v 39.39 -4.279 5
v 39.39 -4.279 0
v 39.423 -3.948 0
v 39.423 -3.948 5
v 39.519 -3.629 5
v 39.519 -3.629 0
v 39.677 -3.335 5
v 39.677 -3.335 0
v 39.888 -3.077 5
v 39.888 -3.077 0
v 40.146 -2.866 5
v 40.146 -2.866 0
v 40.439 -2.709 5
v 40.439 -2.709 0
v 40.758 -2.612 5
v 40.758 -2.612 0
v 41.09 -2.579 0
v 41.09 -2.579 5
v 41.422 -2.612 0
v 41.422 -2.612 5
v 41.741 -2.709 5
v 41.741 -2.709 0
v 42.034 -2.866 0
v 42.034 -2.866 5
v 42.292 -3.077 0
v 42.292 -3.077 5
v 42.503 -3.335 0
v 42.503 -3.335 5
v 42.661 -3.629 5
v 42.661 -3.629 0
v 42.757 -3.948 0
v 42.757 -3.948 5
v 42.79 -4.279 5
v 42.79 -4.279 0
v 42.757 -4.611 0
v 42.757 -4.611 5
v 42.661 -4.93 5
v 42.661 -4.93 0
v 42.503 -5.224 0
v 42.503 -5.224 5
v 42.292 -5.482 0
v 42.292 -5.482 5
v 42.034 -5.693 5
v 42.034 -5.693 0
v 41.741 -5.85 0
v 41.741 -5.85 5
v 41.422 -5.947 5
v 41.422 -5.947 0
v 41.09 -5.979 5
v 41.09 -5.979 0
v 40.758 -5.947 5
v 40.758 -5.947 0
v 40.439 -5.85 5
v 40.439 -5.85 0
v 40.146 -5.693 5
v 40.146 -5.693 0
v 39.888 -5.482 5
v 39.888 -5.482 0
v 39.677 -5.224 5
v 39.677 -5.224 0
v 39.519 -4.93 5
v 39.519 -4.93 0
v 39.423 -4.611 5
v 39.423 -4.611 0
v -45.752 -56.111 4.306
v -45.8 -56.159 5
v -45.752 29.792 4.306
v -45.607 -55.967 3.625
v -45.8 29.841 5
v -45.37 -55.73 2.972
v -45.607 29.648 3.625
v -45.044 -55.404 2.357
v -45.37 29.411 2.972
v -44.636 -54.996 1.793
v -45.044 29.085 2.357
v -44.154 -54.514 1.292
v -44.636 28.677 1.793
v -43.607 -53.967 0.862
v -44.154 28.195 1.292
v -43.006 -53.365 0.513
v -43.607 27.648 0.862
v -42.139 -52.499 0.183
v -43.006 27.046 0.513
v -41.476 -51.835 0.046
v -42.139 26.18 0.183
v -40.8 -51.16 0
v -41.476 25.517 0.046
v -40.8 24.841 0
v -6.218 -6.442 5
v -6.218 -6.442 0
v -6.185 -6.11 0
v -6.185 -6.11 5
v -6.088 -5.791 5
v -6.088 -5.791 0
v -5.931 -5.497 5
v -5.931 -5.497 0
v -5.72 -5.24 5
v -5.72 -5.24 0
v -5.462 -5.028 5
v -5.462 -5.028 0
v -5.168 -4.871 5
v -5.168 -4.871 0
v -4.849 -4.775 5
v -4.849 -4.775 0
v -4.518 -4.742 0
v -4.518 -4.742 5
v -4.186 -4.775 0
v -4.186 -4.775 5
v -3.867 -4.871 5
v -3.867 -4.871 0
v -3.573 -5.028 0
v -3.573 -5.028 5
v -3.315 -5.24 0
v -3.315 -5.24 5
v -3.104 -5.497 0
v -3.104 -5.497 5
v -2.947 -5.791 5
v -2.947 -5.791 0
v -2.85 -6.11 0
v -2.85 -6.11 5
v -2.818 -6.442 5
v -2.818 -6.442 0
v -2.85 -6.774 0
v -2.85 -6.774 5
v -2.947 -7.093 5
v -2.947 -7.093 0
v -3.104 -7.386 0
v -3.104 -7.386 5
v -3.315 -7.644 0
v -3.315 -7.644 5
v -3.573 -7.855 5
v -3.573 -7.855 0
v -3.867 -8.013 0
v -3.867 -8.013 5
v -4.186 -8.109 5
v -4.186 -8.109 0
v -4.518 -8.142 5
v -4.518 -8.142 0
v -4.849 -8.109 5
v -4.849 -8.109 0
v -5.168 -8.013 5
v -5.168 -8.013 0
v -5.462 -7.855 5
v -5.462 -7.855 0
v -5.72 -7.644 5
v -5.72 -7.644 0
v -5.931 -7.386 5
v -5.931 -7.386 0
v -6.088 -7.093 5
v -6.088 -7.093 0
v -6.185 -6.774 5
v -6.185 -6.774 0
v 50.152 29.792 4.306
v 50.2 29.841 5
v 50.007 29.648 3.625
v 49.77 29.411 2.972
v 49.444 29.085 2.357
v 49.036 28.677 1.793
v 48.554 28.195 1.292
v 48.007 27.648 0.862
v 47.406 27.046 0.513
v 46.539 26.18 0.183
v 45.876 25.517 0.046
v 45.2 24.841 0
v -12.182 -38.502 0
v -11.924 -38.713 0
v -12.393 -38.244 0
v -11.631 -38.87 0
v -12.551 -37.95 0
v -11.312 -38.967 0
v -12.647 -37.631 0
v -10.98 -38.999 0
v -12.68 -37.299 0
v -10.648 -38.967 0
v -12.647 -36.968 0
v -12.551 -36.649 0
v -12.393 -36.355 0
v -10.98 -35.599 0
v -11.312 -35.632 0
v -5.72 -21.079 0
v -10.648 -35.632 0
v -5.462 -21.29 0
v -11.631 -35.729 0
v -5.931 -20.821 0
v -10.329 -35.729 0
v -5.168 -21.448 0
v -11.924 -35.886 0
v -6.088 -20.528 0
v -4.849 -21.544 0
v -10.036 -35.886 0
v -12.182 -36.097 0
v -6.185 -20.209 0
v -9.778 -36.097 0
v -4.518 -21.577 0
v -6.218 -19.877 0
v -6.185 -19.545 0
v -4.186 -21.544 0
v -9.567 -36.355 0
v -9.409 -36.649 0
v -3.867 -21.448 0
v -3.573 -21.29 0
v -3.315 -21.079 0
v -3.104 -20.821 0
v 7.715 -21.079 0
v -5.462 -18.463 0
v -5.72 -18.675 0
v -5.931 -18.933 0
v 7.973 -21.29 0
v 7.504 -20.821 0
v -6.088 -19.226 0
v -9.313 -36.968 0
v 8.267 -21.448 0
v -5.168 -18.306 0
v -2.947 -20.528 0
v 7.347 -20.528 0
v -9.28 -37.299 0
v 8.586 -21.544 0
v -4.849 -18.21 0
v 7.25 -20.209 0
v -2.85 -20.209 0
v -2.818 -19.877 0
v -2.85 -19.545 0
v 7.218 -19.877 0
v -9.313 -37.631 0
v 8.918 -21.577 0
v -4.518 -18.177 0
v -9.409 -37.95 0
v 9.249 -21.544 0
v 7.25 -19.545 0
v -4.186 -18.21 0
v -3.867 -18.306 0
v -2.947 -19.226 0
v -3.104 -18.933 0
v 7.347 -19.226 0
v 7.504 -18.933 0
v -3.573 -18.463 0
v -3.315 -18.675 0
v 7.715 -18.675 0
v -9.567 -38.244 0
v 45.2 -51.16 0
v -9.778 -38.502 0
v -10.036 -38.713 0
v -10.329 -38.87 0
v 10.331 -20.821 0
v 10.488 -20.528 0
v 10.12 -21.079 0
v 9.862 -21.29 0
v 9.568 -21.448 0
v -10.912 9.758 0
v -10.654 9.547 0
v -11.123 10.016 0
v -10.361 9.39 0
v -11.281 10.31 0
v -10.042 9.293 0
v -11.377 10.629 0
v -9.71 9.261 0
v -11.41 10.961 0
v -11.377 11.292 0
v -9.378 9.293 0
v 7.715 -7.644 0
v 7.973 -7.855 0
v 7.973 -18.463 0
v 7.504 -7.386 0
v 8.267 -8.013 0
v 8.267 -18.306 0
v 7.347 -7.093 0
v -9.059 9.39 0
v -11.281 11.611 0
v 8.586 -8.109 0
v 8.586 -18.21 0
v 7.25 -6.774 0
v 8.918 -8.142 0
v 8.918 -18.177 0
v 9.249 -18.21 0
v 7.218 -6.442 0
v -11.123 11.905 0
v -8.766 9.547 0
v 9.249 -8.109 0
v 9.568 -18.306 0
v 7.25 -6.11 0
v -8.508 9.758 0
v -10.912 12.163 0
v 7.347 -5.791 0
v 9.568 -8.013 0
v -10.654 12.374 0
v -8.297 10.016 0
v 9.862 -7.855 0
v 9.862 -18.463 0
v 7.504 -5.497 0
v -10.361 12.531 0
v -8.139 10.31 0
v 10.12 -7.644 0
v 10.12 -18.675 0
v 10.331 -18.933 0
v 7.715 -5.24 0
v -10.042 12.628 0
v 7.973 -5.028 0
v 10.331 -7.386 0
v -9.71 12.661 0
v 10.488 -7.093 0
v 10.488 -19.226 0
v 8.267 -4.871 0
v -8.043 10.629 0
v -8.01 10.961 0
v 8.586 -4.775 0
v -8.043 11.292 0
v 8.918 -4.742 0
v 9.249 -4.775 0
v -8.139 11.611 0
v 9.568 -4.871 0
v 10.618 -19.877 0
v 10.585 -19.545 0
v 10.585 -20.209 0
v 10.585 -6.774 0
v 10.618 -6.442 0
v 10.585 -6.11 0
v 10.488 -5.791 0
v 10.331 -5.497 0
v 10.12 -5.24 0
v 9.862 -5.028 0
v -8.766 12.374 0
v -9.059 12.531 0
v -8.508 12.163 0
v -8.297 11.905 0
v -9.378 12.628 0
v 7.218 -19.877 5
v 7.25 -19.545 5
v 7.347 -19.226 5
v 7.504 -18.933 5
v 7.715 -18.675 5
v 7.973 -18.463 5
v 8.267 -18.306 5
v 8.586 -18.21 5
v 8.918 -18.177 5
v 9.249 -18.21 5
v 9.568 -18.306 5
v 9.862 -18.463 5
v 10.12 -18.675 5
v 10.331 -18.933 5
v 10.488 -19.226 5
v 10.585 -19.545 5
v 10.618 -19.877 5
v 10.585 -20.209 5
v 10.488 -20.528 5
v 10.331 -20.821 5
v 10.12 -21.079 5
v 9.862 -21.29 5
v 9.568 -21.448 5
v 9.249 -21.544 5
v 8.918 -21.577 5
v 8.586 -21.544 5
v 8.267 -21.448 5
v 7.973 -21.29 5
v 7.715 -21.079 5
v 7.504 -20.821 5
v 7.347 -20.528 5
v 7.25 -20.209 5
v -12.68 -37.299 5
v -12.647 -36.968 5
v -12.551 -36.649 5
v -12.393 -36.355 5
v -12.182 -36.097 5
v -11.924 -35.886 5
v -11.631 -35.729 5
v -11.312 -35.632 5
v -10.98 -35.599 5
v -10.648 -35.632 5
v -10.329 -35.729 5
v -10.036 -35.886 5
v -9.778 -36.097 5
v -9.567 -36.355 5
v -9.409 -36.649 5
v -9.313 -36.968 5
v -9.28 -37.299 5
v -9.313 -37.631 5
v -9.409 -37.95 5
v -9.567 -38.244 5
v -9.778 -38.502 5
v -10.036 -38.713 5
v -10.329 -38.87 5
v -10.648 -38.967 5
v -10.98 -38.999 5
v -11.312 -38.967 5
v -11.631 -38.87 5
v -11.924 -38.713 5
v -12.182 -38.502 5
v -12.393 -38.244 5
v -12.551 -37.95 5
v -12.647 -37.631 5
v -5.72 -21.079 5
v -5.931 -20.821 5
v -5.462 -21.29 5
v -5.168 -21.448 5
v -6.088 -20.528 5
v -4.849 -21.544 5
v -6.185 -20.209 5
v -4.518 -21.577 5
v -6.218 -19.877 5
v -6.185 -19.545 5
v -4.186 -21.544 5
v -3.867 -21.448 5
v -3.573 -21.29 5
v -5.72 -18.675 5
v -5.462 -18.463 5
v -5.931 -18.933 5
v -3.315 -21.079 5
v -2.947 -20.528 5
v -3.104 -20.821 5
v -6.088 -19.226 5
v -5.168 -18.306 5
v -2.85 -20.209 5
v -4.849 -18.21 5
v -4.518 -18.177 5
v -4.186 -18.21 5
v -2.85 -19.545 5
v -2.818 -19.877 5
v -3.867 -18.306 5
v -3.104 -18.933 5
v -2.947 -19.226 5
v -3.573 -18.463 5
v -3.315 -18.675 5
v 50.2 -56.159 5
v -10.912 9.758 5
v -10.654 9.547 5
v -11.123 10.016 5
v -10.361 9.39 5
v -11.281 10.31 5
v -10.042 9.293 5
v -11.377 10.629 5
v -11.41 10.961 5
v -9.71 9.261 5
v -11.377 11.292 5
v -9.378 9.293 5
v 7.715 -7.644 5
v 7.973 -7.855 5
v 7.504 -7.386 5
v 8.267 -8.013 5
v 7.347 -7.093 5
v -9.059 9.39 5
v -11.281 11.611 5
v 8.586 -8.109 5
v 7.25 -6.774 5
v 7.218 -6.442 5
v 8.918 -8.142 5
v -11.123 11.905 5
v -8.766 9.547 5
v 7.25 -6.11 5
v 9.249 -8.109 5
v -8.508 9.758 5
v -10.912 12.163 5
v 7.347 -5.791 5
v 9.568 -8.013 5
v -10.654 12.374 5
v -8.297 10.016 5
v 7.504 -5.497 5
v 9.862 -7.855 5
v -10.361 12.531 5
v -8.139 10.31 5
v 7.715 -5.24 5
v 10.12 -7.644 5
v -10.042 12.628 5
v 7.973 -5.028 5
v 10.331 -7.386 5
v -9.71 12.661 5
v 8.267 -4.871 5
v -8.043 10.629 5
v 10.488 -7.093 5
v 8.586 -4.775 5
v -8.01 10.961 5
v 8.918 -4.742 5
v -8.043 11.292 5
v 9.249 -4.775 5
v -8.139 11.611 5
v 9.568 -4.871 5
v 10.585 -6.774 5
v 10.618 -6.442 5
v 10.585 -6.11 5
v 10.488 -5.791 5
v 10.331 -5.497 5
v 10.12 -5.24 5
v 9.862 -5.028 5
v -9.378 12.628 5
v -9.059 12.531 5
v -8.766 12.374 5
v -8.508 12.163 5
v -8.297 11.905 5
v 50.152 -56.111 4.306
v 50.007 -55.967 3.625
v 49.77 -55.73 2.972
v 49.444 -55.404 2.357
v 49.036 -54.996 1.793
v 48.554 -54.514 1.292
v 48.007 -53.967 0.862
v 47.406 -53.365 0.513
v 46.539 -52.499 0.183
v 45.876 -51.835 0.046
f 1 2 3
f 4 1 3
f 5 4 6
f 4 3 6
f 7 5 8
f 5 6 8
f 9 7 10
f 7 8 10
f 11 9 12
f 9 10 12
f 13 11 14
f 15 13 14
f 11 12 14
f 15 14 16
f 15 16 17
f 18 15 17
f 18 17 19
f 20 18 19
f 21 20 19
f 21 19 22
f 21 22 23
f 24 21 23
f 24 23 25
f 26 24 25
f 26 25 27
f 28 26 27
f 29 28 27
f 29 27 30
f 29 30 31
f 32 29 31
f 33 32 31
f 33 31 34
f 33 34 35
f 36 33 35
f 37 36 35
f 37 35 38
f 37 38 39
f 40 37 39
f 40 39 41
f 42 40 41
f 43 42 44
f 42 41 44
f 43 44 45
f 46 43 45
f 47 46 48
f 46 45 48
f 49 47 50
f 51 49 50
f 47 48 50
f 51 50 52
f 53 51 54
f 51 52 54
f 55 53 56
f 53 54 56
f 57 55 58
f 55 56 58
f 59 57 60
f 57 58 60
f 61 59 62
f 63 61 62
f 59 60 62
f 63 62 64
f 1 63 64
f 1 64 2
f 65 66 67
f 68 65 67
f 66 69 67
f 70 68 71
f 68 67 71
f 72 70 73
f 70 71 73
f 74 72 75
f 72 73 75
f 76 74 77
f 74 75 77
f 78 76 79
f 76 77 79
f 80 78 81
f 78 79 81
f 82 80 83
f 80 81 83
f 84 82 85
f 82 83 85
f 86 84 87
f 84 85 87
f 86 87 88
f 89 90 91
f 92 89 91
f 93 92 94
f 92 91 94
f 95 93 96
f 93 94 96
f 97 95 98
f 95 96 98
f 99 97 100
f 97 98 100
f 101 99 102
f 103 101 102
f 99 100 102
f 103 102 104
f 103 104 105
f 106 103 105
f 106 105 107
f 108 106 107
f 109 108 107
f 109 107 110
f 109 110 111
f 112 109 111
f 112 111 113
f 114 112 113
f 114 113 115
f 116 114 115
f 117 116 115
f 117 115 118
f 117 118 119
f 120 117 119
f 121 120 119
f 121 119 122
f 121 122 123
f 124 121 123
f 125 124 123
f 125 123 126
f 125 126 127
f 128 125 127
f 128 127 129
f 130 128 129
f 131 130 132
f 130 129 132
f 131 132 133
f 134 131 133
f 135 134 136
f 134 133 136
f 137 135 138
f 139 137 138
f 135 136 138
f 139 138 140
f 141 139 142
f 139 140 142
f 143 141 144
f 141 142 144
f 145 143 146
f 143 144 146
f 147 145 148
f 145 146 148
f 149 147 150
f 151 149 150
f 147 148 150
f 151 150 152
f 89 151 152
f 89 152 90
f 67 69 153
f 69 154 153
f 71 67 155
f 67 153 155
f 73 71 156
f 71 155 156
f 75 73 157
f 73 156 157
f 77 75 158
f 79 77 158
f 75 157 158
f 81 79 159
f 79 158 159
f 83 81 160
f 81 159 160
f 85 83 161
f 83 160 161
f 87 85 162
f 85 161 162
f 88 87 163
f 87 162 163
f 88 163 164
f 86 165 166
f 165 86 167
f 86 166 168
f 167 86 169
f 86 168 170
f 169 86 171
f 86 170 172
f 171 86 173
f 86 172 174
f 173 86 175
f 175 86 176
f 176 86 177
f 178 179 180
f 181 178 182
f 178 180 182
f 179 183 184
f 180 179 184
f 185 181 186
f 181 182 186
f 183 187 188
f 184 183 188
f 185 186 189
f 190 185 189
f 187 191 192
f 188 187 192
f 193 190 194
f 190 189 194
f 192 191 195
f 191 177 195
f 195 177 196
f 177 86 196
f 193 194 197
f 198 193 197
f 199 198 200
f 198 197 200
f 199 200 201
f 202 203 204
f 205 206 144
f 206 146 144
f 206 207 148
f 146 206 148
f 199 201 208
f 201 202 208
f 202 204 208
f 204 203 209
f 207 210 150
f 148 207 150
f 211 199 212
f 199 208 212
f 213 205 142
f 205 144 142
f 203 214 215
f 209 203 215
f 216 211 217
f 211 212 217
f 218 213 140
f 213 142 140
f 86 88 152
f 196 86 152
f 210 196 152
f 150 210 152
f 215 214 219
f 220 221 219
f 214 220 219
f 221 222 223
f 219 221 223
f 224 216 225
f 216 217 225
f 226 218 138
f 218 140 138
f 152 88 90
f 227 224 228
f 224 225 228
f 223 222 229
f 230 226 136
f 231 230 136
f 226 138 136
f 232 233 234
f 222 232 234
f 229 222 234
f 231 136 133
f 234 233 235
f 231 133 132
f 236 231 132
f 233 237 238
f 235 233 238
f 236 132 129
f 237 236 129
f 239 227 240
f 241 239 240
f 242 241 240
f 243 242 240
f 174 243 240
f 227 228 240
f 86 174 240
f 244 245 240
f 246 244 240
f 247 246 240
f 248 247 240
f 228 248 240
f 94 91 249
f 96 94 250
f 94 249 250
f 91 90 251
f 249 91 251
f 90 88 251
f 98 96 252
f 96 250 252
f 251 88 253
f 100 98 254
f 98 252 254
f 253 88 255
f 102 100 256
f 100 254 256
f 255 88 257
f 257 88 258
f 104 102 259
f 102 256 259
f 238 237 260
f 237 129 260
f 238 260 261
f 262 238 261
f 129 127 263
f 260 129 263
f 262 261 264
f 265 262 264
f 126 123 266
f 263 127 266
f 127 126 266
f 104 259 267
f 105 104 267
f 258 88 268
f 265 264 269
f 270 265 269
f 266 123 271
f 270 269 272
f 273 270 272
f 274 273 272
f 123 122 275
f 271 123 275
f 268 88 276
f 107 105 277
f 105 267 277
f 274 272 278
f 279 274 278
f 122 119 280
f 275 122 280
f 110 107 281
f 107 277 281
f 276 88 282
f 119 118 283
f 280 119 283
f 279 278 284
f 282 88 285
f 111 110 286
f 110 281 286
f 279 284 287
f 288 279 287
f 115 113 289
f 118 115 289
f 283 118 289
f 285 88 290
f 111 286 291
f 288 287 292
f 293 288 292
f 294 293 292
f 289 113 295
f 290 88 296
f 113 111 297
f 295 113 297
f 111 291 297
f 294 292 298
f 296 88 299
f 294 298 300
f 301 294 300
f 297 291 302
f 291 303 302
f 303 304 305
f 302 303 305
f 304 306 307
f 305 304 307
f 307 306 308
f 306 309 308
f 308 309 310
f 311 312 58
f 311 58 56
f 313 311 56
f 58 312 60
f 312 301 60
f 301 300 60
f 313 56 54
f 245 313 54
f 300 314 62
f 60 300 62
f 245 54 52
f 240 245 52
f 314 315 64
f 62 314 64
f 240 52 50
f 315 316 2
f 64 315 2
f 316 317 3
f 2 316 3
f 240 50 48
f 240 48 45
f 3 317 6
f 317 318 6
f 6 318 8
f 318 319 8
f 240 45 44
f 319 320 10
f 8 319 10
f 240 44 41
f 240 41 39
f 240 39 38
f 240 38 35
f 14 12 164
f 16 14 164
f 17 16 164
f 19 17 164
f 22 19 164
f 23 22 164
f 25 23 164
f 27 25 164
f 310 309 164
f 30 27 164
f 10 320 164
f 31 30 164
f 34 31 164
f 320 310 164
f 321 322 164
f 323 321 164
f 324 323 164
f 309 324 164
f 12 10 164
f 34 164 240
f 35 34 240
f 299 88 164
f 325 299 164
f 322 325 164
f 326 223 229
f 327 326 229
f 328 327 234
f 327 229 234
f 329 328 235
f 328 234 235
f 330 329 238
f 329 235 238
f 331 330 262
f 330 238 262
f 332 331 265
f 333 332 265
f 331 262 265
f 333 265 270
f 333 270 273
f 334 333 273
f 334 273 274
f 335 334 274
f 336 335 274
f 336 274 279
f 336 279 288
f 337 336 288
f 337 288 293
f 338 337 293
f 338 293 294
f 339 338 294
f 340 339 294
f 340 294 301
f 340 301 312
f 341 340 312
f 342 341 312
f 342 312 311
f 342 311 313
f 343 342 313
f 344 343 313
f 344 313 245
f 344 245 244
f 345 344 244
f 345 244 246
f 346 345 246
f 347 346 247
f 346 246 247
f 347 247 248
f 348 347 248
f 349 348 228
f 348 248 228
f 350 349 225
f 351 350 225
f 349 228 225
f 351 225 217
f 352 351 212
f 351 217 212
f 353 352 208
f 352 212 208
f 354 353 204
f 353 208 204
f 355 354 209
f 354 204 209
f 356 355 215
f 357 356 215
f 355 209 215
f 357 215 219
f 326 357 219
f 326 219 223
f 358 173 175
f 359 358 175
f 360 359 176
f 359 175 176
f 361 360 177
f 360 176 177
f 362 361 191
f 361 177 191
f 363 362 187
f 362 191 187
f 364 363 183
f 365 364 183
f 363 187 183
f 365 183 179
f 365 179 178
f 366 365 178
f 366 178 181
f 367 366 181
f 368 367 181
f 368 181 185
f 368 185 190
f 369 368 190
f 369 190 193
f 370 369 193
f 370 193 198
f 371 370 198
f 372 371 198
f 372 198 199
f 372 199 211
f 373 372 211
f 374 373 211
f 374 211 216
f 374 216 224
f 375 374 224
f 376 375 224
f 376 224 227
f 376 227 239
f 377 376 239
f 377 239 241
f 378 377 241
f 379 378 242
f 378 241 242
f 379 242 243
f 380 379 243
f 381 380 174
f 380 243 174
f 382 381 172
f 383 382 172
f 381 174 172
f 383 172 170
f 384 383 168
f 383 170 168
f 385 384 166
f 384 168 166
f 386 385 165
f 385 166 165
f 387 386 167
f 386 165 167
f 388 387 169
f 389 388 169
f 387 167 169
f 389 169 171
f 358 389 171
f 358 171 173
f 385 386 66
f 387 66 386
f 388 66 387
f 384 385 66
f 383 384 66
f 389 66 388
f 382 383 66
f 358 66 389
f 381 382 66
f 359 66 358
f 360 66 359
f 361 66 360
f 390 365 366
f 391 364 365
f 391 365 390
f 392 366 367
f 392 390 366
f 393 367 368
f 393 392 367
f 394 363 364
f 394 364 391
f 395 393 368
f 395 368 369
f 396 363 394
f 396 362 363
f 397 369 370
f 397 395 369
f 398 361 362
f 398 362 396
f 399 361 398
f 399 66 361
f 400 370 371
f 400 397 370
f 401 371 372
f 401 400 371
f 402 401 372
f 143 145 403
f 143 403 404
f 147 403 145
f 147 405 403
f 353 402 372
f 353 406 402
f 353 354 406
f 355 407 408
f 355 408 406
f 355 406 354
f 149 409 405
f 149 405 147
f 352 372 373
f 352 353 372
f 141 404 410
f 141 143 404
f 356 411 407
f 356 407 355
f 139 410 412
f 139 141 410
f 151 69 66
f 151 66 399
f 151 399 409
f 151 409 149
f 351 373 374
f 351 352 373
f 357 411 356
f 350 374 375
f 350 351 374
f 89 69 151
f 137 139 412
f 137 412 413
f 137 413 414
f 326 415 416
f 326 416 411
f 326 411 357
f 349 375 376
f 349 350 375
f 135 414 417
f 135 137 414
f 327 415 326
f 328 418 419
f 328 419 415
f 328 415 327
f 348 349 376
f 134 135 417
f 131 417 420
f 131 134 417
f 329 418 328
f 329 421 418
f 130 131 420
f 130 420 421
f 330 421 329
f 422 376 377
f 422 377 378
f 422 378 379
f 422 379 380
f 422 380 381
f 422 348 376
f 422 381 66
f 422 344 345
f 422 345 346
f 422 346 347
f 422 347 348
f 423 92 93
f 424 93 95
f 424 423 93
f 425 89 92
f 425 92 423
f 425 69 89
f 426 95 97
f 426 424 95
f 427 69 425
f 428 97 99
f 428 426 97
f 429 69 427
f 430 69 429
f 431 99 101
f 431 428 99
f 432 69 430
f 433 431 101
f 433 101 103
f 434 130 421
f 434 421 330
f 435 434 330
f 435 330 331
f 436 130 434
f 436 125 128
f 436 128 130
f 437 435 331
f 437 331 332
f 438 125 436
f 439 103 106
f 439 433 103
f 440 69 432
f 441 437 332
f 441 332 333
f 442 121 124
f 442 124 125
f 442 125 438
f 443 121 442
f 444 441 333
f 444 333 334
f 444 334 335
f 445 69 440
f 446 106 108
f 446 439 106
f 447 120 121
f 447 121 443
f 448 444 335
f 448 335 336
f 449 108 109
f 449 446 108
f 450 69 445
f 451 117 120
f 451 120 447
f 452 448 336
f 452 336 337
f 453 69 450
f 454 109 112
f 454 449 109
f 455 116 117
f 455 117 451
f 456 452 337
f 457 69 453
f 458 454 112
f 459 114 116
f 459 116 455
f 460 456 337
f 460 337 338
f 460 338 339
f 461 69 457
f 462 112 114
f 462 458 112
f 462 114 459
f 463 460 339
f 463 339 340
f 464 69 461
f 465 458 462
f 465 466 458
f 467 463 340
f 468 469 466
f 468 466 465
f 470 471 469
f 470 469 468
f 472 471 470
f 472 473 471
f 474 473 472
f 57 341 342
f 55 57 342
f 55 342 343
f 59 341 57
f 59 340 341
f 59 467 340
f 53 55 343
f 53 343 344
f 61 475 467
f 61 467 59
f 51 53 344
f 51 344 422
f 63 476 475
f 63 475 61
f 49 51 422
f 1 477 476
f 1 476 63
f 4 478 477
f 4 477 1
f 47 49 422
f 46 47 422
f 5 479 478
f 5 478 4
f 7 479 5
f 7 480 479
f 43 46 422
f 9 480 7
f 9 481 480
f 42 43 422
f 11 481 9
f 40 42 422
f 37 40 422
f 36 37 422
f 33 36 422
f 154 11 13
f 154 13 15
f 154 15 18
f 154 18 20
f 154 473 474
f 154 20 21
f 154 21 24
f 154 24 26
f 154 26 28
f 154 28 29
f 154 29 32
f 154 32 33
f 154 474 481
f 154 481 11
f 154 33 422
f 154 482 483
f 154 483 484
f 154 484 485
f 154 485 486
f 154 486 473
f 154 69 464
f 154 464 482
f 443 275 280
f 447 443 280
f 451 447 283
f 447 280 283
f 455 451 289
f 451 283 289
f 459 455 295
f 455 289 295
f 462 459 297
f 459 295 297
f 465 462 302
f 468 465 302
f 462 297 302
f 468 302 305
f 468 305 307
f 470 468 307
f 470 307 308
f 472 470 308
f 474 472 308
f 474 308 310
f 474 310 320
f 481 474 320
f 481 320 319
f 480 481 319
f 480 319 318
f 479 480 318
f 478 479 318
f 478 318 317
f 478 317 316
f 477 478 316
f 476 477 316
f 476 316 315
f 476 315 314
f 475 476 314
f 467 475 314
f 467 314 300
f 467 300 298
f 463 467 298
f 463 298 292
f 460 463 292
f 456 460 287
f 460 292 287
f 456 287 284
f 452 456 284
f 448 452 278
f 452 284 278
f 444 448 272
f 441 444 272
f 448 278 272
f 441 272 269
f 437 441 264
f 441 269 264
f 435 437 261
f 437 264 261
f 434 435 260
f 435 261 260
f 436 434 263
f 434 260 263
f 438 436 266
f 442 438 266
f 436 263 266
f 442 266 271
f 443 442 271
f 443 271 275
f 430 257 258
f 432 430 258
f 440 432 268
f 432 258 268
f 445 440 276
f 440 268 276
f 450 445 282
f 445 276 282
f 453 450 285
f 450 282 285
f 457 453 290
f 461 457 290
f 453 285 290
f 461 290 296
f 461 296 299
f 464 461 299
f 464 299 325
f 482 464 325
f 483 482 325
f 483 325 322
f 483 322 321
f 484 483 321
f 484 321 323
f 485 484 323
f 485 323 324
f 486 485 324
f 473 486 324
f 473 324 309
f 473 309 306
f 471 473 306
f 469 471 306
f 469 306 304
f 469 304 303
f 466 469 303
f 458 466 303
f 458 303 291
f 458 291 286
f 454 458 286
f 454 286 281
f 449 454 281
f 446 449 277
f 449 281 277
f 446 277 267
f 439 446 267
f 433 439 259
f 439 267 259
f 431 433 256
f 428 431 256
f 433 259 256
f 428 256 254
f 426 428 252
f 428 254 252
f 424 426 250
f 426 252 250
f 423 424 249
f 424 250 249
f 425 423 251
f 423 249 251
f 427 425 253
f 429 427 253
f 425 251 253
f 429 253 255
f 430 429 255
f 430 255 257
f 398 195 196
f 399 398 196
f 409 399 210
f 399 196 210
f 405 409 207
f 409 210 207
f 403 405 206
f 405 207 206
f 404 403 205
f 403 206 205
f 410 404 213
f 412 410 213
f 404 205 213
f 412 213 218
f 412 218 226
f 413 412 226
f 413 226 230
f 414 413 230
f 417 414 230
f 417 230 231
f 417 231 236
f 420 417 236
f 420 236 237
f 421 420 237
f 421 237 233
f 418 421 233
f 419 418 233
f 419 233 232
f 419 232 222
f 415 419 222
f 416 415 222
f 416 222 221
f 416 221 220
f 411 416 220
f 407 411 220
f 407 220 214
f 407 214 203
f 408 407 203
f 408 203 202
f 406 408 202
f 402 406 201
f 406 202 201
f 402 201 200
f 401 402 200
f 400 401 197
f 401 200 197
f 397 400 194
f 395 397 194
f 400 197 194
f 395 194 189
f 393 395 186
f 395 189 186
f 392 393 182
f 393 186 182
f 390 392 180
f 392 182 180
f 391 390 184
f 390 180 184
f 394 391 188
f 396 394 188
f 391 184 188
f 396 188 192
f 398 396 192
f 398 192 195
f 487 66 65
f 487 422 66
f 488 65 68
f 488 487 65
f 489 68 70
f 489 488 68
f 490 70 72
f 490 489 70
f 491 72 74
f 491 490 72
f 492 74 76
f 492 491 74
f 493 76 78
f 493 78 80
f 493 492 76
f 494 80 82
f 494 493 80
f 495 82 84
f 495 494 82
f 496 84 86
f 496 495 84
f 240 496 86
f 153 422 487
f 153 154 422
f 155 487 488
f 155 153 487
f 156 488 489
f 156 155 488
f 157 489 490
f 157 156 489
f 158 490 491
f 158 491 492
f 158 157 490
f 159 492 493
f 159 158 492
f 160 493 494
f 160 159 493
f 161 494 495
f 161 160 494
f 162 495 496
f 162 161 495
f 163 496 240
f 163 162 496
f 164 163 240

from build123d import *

# Parameters (mm, degrees)
ESQUISSE1_W        = 96
ESQUISSE1_H        = 86
BOSS_EXTRU_1_DEPTH = 5
CONG_2_R           = 5
TROUM3_D           = 3.4


with BuildPart() as part:
    # Esquisse1 → Boss.-Extru.1 (new body)
    with BuildSketch(Plane.XY):
        with Locations((2.2, -13.159463773)):
            Rectangle(ESQUISSE1_W, ESQUISSE1_H)
    extrude(amount=BOSS_EXTRU_1_DEPTH)

    # Congé2
    cong_2_edges = [part.edges().sort_by_distance(p)[0] for p in [
        (-45.8, -13.159463773, 0),
        (2.2, -56.159463773, 0),
        (50.2, -13.159463773, 0),
        (2.2, 29.840536227, 0),
    ]]
    fillet(cong_2_edges, radius=CONG_2_R - 0.0001)  # a hair under: the kernel refuses the full size

    # TrouM3 (through all)
    with Locations(Plane.XY.offset(5)):
        with Locations((-9.71, 10.960536227), (41.09, -4.279463773), (-10.98, -37.299463773), (-4.517514421, -19.876978194), (-4.517514421, -6.441949352), (8.917514421, -6.441949352), (8.917514421, -19.876978194)):
            Hole(TROUM3_D / 2)


solid = part.part
